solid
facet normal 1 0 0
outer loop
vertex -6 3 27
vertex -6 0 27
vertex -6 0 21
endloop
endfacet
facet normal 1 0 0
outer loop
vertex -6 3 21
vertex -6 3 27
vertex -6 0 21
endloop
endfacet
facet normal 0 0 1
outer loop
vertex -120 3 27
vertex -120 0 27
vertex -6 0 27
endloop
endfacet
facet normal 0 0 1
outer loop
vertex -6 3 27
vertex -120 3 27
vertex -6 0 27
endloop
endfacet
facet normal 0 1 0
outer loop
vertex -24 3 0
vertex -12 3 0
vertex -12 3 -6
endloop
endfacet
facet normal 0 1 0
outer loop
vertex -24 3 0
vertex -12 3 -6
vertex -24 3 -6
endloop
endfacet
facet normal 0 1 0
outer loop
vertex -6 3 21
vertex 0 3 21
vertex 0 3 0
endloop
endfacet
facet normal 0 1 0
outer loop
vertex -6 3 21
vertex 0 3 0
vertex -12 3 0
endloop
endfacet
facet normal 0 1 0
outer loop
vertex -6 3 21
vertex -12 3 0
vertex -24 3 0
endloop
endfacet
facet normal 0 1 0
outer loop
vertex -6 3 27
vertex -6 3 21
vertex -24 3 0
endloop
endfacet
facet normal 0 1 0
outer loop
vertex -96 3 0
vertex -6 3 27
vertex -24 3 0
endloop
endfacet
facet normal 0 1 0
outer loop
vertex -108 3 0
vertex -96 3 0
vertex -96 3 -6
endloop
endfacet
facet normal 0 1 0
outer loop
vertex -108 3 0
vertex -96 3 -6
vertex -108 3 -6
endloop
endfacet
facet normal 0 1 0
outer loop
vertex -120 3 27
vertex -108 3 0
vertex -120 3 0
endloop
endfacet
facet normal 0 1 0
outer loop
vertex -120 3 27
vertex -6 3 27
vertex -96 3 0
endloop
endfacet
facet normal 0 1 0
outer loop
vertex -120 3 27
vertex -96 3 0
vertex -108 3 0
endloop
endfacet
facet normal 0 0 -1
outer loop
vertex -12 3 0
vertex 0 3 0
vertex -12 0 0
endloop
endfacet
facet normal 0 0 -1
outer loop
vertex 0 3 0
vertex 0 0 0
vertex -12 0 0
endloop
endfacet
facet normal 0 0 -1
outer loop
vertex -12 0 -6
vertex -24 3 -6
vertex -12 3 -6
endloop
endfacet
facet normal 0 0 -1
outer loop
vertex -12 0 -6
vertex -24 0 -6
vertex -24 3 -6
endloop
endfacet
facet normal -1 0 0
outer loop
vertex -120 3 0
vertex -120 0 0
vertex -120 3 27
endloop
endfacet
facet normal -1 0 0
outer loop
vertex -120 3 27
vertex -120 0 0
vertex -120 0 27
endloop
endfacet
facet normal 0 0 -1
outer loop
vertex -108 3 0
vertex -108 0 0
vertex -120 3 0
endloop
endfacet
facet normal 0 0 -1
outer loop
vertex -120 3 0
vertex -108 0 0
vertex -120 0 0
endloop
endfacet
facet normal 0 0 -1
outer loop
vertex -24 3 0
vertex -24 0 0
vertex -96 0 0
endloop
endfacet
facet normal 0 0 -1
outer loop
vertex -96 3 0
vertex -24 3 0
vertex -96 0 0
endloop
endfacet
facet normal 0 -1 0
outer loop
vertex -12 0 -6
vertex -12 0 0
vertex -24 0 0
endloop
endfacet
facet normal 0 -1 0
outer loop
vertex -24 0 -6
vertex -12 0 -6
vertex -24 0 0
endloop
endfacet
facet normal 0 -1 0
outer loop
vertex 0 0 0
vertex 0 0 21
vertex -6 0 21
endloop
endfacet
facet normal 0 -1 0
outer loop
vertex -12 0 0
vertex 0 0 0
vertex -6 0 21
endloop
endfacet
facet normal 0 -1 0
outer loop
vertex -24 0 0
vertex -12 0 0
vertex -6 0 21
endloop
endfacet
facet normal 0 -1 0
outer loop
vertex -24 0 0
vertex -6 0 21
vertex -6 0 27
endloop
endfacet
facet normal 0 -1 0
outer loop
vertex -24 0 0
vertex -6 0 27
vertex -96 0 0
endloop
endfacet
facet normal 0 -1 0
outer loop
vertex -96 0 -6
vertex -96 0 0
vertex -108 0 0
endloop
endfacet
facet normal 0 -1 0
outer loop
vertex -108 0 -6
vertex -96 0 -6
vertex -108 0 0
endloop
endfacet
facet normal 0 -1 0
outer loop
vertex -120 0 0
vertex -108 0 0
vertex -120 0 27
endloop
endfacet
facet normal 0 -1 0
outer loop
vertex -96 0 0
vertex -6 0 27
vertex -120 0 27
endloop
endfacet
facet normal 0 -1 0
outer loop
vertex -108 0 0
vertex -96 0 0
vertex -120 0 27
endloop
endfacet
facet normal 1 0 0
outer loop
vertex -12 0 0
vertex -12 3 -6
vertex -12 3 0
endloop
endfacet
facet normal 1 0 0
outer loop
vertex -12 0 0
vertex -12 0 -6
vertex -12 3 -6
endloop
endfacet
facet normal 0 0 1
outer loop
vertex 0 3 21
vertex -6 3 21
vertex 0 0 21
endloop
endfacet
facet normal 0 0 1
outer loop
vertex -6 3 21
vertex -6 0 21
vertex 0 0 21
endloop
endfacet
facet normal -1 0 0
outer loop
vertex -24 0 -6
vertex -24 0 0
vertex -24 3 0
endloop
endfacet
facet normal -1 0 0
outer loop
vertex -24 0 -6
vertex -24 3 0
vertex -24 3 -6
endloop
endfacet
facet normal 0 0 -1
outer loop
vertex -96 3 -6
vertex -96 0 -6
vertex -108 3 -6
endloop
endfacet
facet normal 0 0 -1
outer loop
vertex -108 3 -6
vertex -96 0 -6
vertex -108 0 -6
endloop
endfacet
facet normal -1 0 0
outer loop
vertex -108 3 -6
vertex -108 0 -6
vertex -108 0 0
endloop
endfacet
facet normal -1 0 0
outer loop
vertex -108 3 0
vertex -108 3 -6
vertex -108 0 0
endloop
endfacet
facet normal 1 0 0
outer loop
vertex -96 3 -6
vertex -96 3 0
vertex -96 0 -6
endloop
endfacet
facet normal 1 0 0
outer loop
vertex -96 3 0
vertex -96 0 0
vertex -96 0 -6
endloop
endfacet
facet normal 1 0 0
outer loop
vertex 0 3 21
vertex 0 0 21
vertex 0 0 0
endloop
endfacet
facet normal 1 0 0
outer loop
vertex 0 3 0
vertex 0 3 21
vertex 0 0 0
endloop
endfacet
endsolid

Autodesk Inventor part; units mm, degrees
ref_plane "YZ Plane" through (0, 0, 0) normal (1, 0, 0) x (0, 1, 0)
ref_plane "XZ Plane" through (0, 0, 0) normal (0, 1, 0) x (-1, 0, 0)
ref_plane "XY Plane" through (0, 0, 0) normal (0, 0, 1) x (1, 0, 0)
sketch "Sketch1" plane through (0, 0, 0) normal (0, 1, 0) x (-1, 0, 0)
  line L0 (0, 0) -> (120, 0)
  line L1 (120, 0) -> (120, 27)
  line L2 (120, 27) -> (0, 27)
  line L3 (0, 27) -> (0, 0)
  dimension "d5" = 120
  dimension "d6" = 27
extrude "Extrusion1" add sketch "Sketch1" along normal blind 3
sketch "Sketch2" plane through (0, 0, 0) normal (0, -1, 0) x (1, 0, 0)
  line L0 (-120, 27) -> (0, 27) projected
  line L1 (0, 27) -> (-6, 27)
  line L2 (-6, 27) -> (-6, 21)
  line L3 (-6, 21) -> (0, 21)
  line L4 (0, 21) -> (0, 27)
  point P0 (0, 0)
  dimension "d7" = 6
  dimension "d8" = 6
extrude "Extrusion2" cut sketch "Sketch2" along normal through all both and the other way through all
sketch "Sketch3" plane through (0, 0, 0) normal (0, -1, 0) x (1, 0, 0)
  line L0 (0, 0) -> (-120, 0) projected
  line L1 (-108, 0) -> (-96, 0)
  line L2 (-96, 0) -> (-96, -6)
  line L3 (-96, -6) -> (-108, -6)
  line L4 (-108, -6) -> (-108, 0)
  line L5 (-12, 0) -> (-24, 0)
  line L6 (-24, 0) -> (-24, -6)
  line L7 (-24, -6) -> (-12, -6)
  line L8 (-12, -6) -> (-12, 0)
  line L9 (0, 21) -> (0, 0) projected
  line L10 (-120, 0) -> (-120, 27) projected
  dimension "d11" = 12
  dimension "d12" = 6
  dimension "d13" = 12
  dimension "d14" = 6
  dimension "d15" = 12
  dimension "d16" = 12
extrude "Extrusion3" add sketch "Sketch3" against normal blind 3
properties part number "ramp-support"
